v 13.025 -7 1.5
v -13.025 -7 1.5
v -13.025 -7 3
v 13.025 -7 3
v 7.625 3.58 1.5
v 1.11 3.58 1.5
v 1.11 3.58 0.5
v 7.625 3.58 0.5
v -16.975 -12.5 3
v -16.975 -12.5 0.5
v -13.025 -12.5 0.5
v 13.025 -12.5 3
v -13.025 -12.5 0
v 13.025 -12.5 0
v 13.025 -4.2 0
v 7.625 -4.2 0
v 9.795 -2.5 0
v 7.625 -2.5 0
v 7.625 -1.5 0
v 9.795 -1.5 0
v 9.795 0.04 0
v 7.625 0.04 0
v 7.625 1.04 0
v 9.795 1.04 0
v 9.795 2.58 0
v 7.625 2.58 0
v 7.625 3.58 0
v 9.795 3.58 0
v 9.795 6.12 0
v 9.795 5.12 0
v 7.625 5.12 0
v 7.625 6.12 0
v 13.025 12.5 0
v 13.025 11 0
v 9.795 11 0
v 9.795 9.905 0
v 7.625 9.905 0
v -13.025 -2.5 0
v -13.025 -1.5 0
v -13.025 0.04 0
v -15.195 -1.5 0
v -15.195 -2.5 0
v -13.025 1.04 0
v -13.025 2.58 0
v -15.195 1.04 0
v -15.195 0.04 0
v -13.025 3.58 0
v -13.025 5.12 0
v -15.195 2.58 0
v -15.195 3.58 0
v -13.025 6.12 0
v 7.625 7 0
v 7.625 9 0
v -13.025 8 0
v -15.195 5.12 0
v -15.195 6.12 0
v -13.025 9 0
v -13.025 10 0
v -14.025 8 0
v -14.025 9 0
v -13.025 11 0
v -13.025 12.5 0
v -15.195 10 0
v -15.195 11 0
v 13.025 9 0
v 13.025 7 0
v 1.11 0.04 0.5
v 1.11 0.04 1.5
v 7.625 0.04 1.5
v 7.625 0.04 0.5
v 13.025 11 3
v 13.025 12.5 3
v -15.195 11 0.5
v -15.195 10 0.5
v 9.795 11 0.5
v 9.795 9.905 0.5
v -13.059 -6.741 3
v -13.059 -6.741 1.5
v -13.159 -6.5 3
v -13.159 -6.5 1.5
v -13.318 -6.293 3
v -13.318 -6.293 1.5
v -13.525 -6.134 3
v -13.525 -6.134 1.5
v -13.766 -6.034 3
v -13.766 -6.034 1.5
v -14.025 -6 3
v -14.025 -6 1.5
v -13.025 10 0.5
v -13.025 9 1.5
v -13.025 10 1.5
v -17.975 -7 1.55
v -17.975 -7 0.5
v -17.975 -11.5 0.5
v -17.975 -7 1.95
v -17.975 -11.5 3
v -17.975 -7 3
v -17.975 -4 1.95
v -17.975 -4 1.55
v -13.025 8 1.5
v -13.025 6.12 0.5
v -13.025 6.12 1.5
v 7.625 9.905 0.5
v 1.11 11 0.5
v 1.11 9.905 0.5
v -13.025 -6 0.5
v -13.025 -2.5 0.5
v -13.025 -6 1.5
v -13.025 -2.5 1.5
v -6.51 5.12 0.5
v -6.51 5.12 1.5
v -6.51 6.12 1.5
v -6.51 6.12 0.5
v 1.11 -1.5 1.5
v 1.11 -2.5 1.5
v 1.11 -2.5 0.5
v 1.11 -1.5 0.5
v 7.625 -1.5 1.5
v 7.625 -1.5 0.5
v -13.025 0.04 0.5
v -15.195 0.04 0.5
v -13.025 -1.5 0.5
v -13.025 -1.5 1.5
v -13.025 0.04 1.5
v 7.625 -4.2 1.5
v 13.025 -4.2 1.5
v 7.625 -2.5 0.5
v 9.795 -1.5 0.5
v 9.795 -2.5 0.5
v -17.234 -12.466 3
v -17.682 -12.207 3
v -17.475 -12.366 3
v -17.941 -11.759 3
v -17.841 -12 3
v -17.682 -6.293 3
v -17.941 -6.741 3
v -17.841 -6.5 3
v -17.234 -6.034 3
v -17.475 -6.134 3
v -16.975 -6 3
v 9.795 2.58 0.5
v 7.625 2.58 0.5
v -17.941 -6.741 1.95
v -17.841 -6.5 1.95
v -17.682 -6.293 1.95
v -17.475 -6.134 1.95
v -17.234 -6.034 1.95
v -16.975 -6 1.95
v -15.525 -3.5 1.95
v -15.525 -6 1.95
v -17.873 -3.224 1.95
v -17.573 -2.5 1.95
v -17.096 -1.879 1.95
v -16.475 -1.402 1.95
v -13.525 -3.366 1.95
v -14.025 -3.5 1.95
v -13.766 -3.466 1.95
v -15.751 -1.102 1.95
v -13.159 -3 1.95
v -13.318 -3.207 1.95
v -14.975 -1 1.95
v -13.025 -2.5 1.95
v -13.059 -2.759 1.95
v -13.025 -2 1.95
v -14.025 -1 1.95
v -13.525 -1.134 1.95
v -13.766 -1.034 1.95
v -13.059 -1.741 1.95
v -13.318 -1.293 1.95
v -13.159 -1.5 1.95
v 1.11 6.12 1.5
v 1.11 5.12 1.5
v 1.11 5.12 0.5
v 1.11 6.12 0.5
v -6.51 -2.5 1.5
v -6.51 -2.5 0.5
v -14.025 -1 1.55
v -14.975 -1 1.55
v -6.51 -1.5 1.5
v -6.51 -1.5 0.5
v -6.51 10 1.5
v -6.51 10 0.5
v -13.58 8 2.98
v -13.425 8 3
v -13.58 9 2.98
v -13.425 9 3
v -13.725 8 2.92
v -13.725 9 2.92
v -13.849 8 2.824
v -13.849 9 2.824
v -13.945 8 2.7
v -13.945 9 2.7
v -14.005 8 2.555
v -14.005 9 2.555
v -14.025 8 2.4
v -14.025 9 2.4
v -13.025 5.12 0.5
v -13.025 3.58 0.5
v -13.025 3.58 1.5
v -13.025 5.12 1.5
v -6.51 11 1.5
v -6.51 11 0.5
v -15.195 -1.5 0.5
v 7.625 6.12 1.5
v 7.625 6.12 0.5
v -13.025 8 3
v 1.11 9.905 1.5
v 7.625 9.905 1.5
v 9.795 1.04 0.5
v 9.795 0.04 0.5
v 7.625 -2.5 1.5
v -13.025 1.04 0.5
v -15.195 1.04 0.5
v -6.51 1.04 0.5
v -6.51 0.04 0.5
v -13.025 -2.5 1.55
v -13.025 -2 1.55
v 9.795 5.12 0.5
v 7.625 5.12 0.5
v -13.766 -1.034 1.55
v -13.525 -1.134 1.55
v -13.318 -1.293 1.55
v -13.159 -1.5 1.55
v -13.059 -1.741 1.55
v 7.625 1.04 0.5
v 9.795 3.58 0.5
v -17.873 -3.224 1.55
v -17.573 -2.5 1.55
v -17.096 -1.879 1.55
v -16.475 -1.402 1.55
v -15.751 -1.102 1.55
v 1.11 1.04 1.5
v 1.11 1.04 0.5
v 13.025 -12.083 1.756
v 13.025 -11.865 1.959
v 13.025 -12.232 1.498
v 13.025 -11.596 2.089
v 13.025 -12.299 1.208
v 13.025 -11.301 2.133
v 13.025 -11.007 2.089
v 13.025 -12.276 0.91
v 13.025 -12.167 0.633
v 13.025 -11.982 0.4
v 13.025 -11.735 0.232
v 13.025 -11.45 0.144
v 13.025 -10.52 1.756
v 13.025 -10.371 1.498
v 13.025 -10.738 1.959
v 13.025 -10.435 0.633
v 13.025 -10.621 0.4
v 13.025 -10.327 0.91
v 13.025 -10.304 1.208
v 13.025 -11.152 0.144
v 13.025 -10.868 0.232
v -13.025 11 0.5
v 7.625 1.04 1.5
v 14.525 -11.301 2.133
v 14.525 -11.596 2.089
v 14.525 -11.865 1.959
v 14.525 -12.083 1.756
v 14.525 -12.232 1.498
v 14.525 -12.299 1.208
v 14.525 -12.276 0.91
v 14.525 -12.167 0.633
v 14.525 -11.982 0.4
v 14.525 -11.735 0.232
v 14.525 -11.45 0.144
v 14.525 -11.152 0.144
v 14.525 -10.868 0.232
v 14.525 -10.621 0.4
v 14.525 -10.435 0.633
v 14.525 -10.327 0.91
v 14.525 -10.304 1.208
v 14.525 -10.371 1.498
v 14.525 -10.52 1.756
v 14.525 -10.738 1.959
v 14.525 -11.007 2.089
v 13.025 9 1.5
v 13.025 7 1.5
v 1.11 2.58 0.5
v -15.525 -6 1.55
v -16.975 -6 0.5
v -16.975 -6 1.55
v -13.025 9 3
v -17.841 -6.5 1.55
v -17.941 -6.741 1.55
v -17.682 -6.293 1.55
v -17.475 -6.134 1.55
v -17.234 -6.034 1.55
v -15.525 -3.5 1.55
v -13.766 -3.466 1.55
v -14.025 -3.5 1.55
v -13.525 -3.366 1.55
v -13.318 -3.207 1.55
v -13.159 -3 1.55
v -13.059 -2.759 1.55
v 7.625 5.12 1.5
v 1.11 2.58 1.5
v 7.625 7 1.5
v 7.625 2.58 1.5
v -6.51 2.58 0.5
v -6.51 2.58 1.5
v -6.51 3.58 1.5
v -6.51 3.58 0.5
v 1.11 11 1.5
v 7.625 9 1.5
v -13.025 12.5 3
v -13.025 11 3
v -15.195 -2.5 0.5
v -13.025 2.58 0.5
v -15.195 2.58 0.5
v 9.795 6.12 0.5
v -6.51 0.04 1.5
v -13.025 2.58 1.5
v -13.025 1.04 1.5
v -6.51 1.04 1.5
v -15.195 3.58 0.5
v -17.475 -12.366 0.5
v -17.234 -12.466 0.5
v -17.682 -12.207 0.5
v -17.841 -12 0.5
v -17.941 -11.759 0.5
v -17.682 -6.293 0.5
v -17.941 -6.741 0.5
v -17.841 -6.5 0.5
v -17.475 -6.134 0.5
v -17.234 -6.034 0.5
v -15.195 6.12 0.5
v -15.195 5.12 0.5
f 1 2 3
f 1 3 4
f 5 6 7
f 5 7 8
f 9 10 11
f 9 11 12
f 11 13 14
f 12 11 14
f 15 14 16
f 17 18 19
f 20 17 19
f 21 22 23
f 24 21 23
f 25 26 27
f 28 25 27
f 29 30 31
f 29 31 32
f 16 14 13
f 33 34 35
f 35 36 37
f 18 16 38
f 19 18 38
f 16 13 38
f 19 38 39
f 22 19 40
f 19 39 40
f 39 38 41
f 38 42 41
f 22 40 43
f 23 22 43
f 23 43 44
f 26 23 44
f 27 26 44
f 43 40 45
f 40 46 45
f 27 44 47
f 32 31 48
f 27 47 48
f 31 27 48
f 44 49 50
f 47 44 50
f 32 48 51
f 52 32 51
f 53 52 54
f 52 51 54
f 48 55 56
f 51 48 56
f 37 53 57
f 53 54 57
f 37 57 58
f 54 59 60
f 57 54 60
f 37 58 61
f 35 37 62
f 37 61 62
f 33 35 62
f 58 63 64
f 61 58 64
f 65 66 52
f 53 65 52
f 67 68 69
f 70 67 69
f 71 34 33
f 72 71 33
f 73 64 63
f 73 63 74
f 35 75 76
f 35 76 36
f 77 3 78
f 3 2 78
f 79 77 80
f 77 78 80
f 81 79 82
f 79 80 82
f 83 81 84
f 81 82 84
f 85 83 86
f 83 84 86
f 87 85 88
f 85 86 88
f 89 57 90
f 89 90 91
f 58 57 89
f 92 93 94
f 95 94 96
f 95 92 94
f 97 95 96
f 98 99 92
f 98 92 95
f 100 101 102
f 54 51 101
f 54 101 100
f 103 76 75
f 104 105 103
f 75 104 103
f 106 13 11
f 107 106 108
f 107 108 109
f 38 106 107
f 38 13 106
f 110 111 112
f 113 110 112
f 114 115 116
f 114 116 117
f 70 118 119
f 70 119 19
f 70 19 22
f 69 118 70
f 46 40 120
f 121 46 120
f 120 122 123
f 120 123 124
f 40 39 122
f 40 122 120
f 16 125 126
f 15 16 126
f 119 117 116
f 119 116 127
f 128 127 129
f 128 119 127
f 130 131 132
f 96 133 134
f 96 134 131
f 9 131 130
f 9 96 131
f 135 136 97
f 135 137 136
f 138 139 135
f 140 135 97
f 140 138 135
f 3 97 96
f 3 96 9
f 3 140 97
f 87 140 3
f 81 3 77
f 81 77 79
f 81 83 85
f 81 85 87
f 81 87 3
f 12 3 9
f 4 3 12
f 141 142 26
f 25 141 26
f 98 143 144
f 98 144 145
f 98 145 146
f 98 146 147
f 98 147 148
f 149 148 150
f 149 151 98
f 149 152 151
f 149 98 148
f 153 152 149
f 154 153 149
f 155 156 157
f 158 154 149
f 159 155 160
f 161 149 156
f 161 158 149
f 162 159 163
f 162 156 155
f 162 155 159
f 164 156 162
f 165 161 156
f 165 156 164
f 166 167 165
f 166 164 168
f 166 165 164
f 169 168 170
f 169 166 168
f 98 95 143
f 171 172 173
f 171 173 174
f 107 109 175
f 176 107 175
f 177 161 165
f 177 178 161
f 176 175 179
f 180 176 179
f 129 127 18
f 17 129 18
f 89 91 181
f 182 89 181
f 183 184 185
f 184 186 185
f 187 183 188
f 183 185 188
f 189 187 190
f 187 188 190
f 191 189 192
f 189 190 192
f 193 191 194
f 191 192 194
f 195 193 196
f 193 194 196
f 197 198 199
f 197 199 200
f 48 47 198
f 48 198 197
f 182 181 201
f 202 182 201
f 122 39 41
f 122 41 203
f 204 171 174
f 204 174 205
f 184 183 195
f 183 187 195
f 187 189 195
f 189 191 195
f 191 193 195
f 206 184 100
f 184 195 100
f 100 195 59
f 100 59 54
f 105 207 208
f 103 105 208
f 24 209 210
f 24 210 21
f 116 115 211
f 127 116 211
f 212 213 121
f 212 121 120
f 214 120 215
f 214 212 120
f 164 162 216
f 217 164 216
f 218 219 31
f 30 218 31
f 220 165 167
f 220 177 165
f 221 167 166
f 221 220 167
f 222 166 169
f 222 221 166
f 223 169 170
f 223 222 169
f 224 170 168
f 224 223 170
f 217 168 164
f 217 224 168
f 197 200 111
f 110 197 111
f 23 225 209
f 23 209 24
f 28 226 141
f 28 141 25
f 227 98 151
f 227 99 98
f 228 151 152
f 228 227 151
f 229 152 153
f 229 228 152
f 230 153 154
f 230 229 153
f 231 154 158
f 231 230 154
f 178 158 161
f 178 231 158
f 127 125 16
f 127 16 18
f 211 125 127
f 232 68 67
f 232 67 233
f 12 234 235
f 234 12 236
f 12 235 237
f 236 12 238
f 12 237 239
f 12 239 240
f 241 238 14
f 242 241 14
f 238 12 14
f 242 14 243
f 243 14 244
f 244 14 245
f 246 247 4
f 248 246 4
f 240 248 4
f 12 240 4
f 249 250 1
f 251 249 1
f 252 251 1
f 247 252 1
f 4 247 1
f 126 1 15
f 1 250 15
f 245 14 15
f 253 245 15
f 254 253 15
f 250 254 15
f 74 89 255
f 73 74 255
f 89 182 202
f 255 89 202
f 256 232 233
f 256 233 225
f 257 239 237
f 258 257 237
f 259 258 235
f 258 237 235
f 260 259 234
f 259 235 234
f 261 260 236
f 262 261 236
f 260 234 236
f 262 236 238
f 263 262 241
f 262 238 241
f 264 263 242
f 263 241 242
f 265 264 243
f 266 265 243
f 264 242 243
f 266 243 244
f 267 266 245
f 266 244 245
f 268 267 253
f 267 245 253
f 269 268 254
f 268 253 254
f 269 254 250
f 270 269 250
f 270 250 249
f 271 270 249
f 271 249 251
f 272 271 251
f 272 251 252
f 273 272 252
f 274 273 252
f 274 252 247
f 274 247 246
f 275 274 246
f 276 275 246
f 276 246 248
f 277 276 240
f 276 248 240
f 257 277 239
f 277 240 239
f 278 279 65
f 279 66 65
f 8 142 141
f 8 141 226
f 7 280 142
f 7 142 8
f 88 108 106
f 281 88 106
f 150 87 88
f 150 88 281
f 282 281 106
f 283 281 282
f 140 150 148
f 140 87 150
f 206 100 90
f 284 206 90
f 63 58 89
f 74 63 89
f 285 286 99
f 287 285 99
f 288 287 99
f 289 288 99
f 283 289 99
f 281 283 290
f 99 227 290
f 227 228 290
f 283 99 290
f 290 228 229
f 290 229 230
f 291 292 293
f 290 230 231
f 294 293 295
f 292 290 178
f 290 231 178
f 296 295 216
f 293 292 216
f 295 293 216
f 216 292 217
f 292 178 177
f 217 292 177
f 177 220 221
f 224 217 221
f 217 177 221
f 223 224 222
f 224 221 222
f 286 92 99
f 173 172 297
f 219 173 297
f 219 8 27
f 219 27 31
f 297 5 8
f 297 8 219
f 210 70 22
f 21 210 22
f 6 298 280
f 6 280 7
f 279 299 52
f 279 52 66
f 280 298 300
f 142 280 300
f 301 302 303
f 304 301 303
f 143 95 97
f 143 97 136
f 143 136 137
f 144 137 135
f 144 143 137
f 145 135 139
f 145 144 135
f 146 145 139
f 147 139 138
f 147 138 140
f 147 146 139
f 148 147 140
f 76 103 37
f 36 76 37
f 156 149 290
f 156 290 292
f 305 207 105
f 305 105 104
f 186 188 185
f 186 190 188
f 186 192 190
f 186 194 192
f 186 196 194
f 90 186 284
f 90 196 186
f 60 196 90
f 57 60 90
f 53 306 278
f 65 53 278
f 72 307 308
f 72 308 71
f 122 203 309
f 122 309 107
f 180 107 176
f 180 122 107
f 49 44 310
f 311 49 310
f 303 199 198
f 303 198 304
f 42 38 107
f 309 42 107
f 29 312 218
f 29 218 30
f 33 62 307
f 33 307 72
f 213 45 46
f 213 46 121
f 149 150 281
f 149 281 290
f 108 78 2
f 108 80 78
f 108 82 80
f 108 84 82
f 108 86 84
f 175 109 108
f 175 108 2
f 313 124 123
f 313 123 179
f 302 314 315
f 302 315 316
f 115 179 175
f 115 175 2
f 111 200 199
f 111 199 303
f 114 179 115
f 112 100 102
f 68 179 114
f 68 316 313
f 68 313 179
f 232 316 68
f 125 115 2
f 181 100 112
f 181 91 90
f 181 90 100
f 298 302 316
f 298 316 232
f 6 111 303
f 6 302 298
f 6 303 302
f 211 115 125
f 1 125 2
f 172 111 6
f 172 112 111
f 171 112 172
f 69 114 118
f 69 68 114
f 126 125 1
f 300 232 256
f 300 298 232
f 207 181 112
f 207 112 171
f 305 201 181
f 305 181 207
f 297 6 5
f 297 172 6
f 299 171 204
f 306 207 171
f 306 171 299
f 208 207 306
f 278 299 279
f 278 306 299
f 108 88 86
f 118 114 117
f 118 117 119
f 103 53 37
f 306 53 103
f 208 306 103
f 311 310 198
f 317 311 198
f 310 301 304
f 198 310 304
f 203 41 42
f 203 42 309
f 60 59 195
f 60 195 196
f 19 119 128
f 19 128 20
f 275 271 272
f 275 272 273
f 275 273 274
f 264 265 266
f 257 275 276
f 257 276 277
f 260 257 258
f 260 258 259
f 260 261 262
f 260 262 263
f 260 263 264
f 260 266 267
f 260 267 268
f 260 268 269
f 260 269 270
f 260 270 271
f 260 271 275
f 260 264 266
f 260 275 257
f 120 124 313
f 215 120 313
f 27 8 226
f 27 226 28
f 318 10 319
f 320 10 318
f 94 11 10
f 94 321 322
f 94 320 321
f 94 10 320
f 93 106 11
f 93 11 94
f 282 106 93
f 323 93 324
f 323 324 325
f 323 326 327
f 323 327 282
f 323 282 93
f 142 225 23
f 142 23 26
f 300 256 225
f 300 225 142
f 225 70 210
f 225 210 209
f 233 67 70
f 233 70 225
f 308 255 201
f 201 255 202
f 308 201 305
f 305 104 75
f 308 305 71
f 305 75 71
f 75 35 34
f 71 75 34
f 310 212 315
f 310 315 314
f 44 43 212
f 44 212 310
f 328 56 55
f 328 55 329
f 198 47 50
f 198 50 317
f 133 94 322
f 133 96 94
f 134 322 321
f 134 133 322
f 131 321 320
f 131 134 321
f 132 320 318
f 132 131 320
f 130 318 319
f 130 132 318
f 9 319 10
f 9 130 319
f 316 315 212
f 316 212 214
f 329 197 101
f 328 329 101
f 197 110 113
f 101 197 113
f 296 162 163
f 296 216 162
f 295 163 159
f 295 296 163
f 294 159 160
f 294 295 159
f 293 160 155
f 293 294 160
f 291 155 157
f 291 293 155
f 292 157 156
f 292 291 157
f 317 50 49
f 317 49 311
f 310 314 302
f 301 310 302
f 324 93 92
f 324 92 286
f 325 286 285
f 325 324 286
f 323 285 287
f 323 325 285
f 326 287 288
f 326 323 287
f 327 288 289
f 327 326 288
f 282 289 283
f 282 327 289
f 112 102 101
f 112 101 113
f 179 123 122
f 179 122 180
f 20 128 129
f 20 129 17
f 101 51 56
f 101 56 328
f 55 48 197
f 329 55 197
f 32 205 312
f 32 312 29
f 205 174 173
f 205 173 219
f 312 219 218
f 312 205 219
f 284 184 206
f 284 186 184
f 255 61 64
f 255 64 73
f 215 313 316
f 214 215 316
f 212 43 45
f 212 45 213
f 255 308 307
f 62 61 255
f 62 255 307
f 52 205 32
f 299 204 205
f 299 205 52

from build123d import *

# Parameters (mm, degrees)
SKETCH_1_W            = 26.05
SKETCH_1_H            = 25
EXTRUDE_1_DEPTH       = 1.5
SKETCH_3_W            = 5.4
SKETCH_3_H            = 11.2
CUT_EXTRUDE_1_DEPTH   = 19.114928236
SKETCH_4_W            = 26.05
SKETCH_4_H            = 1.5
EXTRUDE_2_DEPTH       = 1.5
SKETCH_5_W            = 5.4
SKETCH_5_H            = 2
CUT_EXTRUDE_2_DEPTH   = 19.114928236
SKETCH_6_W            = 31
SKETCH_6_H            = 5.5
EXTRUDE_3_DEPTH       = 1.5
SKETCH_7_R            = 1
EXTRUDE_4_DEPTH       = 1.5
EXTRUDE_13_DEPTH      = 1
EXTRUDE_13_DEPTH_BACK = 1.5
SKETCH_10_W           = 4.95
SKETCH_10_H           = 6.5
FILLET_1_R            = 1
SKETCH_11_W           = 4.95
SKETCH_11_H           = 0.4
EXTRUDE_1_2_DEPTH     = 5
SKETCH_12_W           = 2.5
SKETCH_12_H           = 2.5
CUT_EXTRUDE_3_DEPTH   = 22.980744414
FILLET_2_R            = 3
FILLET_3_R            = 1
SKETCH_13_W           = 1
SKETCH_13_H           = 0.4
EXTRUDE_14_DEPTH      = 4
SKETCH_15_W           = 1.5
SKETCH_15_H           = 1
EXTRUDE_15_DEPTH      = 1
SKETCH_16_W           = 1
SKETCH_16_H           = 1
EXTRUDE_16_DEPTH      = 1.5
SKETCH_17_W           = 6.515
SKETCH_17_H           = 1
CUT_EXTRUDE_1_2_DEPTH = 1
SKETCH_18_W           = 0.5
SKETCH_18_H           = 1
EXTRUDE_17_DEPTH      = 2.17
SKETCH_20_W           = 0.5
SKETCH_20_H           = 1
EXTRUDE_18_DEPTH      = 2.17
SKETCH_21_W           = 6.515
SKETCH_21_H           = 1
SKETCH_21_H_2         = 1.095349757
CUT_EXTRUDE_4_DEPTH   = 1
SKETCH_22_W           = 0.5
SKETCH_22_H           = 1
EXTRUDE_19_DEPTH      = 2.17
SKETCH_23_W           = 0.5
SKETCH_23_H           = 1.095349757
EXTRUDE_20_DEPTH      = 2.17
FILLET_4_R            = 0.6


with BuildPart() as part:
    # Эскиз1 → Extrude 1 (new body)
    with BuildSketch(Plane.XY):
        Rectangle(SKETCH_1_W, SKETCH_1_H)
    extrude(amount=EXTRUDE_1_DEPTH)

    # Эскиз3 → Cut-Extrude 1 (cut, through all)
    with BuildSketch(Plane.XY.offset(1.5)):
        with Locations((10.325, 1.4)):
            Rectangle(SKETCH_3_W, SKETCH_3_H)
    extrude(amount=-CUT_EXTRUDE_1_DEPTH, mode=Mode.SUBTRACT)

    # Эскиз4 → Бобышка-Вытянуть2 (add)
    with BuildSketch(Plane.XY.offset(1.5)):
        with Locations((0, 11.75)):
            Rectangle(SKETCH_4_W, SKETCH_4_H)
    extrude(amount=EXTRUDE_2_DEPTH)

    # Эскиз5 → Вырез-Вытянуть2 (cut, through all)
    with BuildSketch(Plane.XY.offset(1.5)):
        with Locations((10.325, 10)):
            Rectangle(SKETCH_5_W, SKETCH_5_H)
    extrude(amount=-CUT_EXTRUDE_2_DEPTH, mode=Mode.SUBTRACT)

    # Эскиз6 → Бобышка-Вытянуть3 (add)
    with BuildSketch(Plane.XY.offset(1.5)):
        with Locations((-2.475, -9.75)):
            Rectangle(SKETCH_6_W, SKETCH_6_H)
    extrude(amount=EXTRUDE_3_DEPTH)

    # Эскиз7 → Бобышка-Вытянуть4 (add)
    with BuildSketch(Plane(origin=(13.025, 0, 0), x_dir=(0, 0, -1), z_dir=(1, 0, 0))):
        with Locations(Location((-1.132985358, -11.301432667, 0), (0, 0, 180))):
            Circle(SKETCH_7_R)
    extrude(amount=EXTRUDE_4_DEPTH)

    # Эскиз10 → Бобышка-Вытянуть13 (add, two sides: drawn at the far end of the back side and taken through both)
    with BuildSketch(Plane(origin=(0, 0, 1.5), x_dir=(-1, 0, 0), z_dir=(0, 0, -1)).offset(-EXTRUDE_13_DEPTH_BACK)):
        with Locations((15.5, -9.25)):
            Rectangle(SKETCH_10_W, SKETCH_10_H)
    extrude(amount=EXTRUDE_13_DEPTH + EXTRUDE_13_DEPTH_BACK)

    # Скругление1
    fillet_1_edges = [part.edges().sort_by_distance(p)[0] for p in [
        (-17.975, -12.5, 1.75),
        (-17.975, -6, 1.75),
        (-13.025, -6, 2.25),
    ]]
    fillet(fillet_1_edges, radius=FILLET_1_R - 0.0001)  # a hair under: the kernel refuses the full size

    # Эскиз11 → Extrude 1 2 (add)
    with BuildSketch(Plane(origin=(0, -6, 0), x_dir=(1, 0, 0), z_dir=(0, 1, 0))):
        with Locations((-15.5, -1.75)):
            Rectangle(SKETCH_11_W, SKETCH_11_H)
    extrude(amount=EXTRUDE_1_2_DEPTH)

    # Эскиз12 → Вырез-Вытянуть3 (cut, through all)
    with BuildSketch(Plane.XY.offset(1.95)):
        with Locations((-14.275, -4.75)):
            Rectangle(SKETCH_12_W, SKETCH_12_H)
    extrude(amount=-CUT_EXTRUDE_3_DEPTH, mode=Mode.SUBTRACT)

    # Скругление2
    fillet_2_edges = [part.edges().sort_by_distance(p)[0] for p in [
        (-17.975, -1, 1.75),
    ]]
    fillet(fillet_2_edges, radius=FILLET_2_R)

    # Скругление3
    fillet_3_edges = [part.edges().sort_by_distance(p)[0] for p in [
        (-13.025, -1, 1.75),
        (-13.025, -3.5, 1.75),
    ]]
    fillet(fillet_3_edges, radius=FILLET_3_R)

    # Эскиз13 → Бобышка-Вытянуть14 (add)
    with BuildSketch(Plane.XZ.offset(6)):
        with Locations((-17.475, 1.75)):
            Rectangle(SKETCH_13_W, SKETCH_13_H)
    extrude(amount=EXTRUDE_14_DEPTH)

    # Эскиз15 → Бобышка-Вытянуть15 (add)
    with BuildSketch(Plane.ZY.offset(13.025)):
        with Locations((0.75, 8.5)):
            Rectangle(SKETCH_15_W, SKETCH_15_H)
    extrude(amount=EXTRUDE_15_DEPTH)

    # Эскиз16 → Бобышка-Вытянуть16 (add)
    with BuildSketch(Plane.XY.offset(1.5)):
        with Locations((-13.525, 8.5)):
            Rectangle(SKETCH_16_W, SKETCH_16_H)
    extrude(amount=EXTRUDE_16_DEPTH)

    # Эскиз17 → Cut-Extrude 1 2 (cut)
    with BuildSketch(Plane.XY.offset(1.5)):
        with Locations((-9.7675, -2)):
            Rectangle(SKETCH_17_W, SKETCH_17_H)
        with Locations((4.3675, -2)):
            Rectangle(SKETCH_17_W, SKETCH_17_H)
        with Locations((-9.7675, 0.54)):
            Rectangle(SKETCH_17_W, SKETCH_17_H)
        with Locations((4.3675, 0.54)):
            Rectangle(SKETCH_17_W, SKETCH_17_H)
        with Locations((-9.7675, 3.08)):
            Rectangle(SKETCH_17_W, SKETCH_17_H)
        with Locations((4.3675, 3.08)):
            Rectangle(SKETCH_17_W, SKETCH_17_H)
        with Locations((-9.7675, 5.62)):
            Rectangle(SKETCH_17_W, SKETCH_17_H)
        with Locations((4.3675, 5.62)):
            Rectangle(SKETCH_17_W, SKETCH_17_H)
    extrude(amount=-CUT_EXTRUDE_1_2_DEPTH, mode=Mode.SUBTRACT)

    # Эскиз18 → Бобышка-Вытянуть17 (add)
    with BuildSketch(Plane(origin=(7.625, 0, 0), x_dir=(0, 0, -1), z_dir=(1, 0, 0))):
        with Locations((-0.25, 3.08)):
            Rectangle(SKETCH_18_W, SKETCH_18_H)
        with Locations((-0.25, 5.62)):
            Rectangle(SKETCH_18_W, SKETCH_18_H)
        with Locations((-0.25, 0.54)):
            Rectangle(SKETCH_18_W, SKETCH_18_H)
        with Locations((-0.25, -2)):
            Rectangle(SKETCH_18_W, SKETCH_18_H)
    extrude(amount=EXTRUDE_17_DEPTH)

    # Эскиз20 → Бобышка-Вытянуть18 (add)
    with BuildSketch(Plane.ZY.offset(13.025)):
        with Locations((0.25, 3.08)):
            Rectangle(SKETCH_20_W, SKETCH_20_H)
        with Locations((0.25, 5.62)):
            Rectangle(SKETCH_20_W, SKETCH_20_H)
        with Locations((0.25, 0.54)):
            Rectangle(SKETCH_20_W, SKETCH_20_H)
        with Locations((0.25, -2)):
            Rectangle(SKETCH_20_W, SKETCH_20_H)
    extrude(amount=EXTRUDE_18_DEPTH)

    # Эскиз21 → Вырез-Вытянуть4 (cut)
    with BuildSketch(Plane.XY.offset(1.5)):
        with Locations((-9.7675, 10.5)):
            Rectangle(SKETCH_21_W, SKETCH_21_H)
        with Locations((4.3675, 10.452325121)):
            Rectangle(SKETCH_21_W, SKETCH_21_H_2)
    extrude(amount=-CUT_EXTRUDE_4_DEPTH, mode=Mode.SUBTRACT)

    # Эскиз22 → Бобышка-Вытянуть19 (add)
    with BuildSketch(Plane.ZY.offset(13.025)):
        with Locations((0.25, 10.5)):
            Rectangle(SKETCH_22_W, SKETCH_22_H)
    extrude(amount=EXTRUDE_19_DEPTH)

    # Эскиз23 → Бобышка-Вытянуть20 (add)
    with BuildSketch(Plane(origin=(7.625, 0, 0), x_dir=(0, 0, -1), z_dir=(1, 0, 0))):
        with Locations((-0.25, 10.452325121)):
            Rectangle(SKETCH_23_W, SKETCH_23_H)
    extrude(amount=EXTRUDE_20_DEPTH)

    # Скругление4
    fillet_4_edges = [part.edges().sort_by_distance(p)[0] for p in [
        (-14.025, 8.5, 3),
    ]]
    fillet(fillet_4_edges, radius=FILLET_4_R)


solid = part.part
